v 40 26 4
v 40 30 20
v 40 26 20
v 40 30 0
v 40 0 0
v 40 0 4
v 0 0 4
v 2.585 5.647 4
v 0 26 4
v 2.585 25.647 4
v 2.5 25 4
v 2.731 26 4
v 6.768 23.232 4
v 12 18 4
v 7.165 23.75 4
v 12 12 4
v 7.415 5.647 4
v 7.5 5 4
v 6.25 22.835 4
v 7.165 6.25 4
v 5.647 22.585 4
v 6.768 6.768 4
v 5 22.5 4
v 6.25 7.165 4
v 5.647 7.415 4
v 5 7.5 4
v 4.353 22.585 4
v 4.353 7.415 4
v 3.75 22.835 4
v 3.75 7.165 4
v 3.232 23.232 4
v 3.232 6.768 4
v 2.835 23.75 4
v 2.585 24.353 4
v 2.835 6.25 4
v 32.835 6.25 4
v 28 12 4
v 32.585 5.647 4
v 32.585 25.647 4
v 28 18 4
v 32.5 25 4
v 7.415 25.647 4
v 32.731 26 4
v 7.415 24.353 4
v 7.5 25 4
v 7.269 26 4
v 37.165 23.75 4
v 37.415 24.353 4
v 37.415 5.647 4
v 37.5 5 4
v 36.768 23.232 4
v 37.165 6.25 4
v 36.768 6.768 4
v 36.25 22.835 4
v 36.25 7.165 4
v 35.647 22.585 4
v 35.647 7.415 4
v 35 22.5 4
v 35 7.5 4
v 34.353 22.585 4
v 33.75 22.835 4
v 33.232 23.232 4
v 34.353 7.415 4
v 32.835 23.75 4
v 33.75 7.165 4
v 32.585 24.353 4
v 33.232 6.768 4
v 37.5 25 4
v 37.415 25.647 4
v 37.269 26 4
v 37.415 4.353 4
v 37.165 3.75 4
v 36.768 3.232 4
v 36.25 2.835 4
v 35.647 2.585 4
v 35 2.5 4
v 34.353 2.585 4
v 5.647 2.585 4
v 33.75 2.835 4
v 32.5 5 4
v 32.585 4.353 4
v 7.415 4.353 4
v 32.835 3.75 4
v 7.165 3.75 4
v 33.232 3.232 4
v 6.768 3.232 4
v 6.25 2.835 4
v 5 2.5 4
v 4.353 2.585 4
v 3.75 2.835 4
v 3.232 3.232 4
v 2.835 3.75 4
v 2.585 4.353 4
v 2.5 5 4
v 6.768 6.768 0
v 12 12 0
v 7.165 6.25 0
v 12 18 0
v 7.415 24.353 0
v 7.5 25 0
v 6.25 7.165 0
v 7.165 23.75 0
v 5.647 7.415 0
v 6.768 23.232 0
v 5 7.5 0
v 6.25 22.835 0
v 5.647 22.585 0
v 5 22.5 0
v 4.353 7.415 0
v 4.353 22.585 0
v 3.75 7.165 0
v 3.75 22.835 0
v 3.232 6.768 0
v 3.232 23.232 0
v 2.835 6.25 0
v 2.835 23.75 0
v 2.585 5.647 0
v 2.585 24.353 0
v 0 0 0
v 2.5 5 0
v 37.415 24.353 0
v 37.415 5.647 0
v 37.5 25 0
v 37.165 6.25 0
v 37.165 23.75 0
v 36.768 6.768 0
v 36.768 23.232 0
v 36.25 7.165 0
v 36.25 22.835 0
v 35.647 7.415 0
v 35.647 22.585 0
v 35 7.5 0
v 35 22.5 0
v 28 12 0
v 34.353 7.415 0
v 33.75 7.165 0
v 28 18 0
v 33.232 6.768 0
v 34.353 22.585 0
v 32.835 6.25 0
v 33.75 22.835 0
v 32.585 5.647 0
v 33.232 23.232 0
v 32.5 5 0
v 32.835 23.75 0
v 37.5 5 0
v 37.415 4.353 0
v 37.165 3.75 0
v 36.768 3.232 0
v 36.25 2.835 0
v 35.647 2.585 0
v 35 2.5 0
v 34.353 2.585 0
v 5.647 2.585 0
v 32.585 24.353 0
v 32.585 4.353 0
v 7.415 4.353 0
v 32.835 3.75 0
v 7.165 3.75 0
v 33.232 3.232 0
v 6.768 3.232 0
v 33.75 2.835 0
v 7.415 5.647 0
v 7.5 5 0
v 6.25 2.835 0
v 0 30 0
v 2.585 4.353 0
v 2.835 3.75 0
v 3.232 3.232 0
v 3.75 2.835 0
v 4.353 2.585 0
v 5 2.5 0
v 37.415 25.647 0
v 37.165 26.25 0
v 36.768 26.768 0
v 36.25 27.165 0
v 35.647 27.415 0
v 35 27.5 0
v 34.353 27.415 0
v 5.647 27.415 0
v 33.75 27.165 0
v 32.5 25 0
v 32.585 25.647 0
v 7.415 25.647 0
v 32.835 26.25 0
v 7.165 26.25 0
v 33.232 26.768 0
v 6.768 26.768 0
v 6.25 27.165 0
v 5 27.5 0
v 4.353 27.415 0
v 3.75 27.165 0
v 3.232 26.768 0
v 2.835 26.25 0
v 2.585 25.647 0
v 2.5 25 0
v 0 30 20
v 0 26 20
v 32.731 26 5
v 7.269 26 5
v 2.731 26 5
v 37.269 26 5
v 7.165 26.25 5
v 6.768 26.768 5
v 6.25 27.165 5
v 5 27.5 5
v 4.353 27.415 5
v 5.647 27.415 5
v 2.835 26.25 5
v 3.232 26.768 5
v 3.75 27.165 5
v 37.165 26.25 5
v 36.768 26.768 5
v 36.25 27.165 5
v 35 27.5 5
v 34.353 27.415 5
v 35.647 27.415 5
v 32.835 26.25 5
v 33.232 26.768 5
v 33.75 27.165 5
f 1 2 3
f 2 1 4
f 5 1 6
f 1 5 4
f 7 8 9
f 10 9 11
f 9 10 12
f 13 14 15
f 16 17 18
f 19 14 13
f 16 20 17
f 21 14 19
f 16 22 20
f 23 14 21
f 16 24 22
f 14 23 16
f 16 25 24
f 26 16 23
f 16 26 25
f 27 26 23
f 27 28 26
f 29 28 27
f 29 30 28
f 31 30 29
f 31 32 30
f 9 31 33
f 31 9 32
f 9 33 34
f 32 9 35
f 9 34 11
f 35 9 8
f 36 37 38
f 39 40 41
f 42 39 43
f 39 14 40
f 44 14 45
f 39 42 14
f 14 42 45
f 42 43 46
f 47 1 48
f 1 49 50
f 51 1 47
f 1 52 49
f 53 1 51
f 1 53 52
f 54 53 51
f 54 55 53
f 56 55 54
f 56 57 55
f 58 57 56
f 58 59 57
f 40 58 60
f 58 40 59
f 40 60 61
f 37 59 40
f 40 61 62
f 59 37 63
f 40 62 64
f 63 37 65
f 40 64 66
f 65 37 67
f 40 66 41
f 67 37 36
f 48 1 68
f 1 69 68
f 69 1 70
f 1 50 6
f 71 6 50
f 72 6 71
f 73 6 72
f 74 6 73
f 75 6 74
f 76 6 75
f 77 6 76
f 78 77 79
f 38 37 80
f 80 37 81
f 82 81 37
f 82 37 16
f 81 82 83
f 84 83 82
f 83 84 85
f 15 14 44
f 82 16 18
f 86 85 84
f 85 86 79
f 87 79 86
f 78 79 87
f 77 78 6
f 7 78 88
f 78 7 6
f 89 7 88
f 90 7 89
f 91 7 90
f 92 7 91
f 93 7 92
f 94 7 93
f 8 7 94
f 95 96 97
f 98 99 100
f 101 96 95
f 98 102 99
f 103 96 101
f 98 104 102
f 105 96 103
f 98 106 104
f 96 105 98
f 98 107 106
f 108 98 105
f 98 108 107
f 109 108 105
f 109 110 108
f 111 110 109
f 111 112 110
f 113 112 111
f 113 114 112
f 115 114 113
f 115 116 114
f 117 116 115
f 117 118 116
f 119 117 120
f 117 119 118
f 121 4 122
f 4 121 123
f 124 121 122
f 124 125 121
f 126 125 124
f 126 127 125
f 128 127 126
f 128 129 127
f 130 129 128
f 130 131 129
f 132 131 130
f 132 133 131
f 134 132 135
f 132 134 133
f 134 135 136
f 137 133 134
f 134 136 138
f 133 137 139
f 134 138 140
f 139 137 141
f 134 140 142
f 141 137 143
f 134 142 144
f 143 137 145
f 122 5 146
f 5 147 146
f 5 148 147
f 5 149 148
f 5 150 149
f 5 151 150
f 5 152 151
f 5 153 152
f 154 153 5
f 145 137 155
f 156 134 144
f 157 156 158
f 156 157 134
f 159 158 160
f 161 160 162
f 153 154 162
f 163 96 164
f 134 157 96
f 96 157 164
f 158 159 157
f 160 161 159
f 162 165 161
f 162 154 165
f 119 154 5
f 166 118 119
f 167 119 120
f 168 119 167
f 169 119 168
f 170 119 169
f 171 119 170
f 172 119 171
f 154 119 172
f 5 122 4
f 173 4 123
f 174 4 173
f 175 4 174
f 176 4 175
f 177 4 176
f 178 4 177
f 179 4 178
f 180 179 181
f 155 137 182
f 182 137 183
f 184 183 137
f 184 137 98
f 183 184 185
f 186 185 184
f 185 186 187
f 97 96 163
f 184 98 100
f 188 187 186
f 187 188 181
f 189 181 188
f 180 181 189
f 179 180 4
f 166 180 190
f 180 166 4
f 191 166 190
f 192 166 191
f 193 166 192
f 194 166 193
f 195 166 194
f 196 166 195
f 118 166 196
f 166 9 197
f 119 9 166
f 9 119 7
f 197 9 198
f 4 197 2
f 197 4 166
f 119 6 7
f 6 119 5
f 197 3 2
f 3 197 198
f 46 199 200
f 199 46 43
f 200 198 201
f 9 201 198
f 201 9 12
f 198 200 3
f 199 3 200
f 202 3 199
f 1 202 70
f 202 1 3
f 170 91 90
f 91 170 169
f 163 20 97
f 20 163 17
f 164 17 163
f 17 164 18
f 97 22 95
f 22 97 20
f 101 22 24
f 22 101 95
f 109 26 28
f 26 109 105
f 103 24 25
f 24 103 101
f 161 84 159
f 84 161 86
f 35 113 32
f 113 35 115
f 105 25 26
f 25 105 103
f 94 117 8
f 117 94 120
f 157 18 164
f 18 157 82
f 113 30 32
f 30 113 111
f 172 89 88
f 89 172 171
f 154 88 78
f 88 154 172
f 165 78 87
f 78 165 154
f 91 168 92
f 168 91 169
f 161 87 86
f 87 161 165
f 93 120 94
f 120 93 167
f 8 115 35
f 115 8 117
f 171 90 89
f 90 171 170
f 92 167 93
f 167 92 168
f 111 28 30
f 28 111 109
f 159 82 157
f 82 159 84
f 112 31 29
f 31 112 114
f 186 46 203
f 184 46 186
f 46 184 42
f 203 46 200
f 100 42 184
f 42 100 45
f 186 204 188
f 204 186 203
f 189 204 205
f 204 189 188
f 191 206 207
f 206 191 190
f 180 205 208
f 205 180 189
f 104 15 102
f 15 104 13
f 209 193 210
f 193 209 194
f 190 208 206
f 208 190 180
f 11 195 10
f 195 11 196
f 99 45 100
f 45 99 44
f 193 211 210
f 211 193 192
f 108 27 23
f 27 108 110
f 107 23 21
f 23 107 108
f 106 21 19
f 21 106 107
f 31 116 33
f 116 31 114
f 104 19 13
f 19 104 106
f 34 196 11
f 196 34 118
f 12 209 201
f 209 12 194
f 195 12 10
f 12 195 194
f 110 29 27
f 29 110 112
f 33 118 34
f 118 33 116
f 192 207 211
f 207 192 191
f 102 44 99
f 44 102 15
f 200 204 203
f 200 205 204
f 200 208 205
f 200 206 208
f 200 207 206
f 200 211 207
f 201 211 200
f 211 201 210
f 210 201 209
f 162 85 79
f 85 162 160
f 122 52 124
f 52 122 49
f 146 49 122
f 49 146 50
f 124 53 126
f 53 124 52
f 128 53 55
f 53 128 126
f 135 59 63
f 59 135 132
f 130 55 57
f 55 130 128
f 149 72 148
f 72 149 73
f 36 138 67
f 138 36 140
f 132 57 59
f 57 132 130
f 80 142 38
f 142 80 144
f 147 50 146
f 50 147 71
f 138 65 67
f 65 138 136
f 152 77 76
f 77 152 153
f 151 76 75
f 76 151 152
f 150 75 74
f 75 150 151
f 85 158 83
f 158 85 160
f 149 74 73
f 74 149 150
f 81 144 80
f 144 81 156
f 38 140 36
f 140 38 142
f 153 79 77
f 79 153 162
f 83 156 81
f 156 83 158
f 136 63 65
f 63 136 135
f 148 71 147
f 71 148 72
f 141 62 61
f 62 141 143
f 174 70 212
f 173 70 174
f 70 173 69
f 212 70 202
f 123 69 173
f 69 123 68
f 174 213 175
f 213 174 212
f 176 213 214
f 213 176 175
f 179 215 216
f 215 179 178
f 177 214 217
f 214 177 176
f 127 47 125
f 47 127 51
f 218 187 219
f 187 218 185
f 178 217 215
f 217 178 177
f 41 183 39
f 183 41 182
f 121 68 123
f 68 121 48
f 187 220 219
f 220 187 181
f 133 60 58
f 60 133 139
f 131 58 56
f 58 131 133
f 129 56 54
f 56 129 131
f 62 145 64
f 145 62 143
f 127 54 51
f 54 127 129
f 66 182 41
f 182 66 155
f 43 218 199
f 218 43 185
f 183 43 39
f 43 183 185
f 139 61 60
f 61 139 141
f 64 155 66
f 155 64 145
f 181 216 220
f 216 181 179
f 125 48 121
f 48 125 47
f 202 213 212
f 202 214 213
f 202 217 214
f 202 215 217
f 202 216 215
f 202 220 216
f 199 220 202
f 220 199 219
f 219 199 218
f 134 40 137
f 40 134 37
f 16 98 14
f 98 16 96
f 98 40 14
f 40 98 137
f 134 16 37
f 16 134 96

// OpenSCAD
// Real part: an L-bracket plate with four mounting holes and a lightening slot.
// Constructs: difference, union, for-loop, translate, rotate, cylinder, cube.
thickness = 4;
plate_x = 40;
plate_y = 30;
hole_r = 2.5;
inset = 5;

module mount_holes() {
    for (x = [inset, plate_x - inset]) {
        for (y = [inset, plate_y - inset]) {
            translate([x, y, -1]) cylinder(h = thickness + 2, r = hole_r, $fn = 24);
        }
    }
}

difference() {
    union() {
        cube([plate_x, plate_y, thickness]);
        // Upstanding flange along the back edge.
        translate([0, plate_y - thickness, 0])
            cube([plate_x, thickness, 20]);
    }
    mount_holes();
    // Central lightening slot.
    translate([plate_x / 2 - 8, plate_y / 2 - 3, -1])
        cube([16, 6, thickness + 2]);
}
